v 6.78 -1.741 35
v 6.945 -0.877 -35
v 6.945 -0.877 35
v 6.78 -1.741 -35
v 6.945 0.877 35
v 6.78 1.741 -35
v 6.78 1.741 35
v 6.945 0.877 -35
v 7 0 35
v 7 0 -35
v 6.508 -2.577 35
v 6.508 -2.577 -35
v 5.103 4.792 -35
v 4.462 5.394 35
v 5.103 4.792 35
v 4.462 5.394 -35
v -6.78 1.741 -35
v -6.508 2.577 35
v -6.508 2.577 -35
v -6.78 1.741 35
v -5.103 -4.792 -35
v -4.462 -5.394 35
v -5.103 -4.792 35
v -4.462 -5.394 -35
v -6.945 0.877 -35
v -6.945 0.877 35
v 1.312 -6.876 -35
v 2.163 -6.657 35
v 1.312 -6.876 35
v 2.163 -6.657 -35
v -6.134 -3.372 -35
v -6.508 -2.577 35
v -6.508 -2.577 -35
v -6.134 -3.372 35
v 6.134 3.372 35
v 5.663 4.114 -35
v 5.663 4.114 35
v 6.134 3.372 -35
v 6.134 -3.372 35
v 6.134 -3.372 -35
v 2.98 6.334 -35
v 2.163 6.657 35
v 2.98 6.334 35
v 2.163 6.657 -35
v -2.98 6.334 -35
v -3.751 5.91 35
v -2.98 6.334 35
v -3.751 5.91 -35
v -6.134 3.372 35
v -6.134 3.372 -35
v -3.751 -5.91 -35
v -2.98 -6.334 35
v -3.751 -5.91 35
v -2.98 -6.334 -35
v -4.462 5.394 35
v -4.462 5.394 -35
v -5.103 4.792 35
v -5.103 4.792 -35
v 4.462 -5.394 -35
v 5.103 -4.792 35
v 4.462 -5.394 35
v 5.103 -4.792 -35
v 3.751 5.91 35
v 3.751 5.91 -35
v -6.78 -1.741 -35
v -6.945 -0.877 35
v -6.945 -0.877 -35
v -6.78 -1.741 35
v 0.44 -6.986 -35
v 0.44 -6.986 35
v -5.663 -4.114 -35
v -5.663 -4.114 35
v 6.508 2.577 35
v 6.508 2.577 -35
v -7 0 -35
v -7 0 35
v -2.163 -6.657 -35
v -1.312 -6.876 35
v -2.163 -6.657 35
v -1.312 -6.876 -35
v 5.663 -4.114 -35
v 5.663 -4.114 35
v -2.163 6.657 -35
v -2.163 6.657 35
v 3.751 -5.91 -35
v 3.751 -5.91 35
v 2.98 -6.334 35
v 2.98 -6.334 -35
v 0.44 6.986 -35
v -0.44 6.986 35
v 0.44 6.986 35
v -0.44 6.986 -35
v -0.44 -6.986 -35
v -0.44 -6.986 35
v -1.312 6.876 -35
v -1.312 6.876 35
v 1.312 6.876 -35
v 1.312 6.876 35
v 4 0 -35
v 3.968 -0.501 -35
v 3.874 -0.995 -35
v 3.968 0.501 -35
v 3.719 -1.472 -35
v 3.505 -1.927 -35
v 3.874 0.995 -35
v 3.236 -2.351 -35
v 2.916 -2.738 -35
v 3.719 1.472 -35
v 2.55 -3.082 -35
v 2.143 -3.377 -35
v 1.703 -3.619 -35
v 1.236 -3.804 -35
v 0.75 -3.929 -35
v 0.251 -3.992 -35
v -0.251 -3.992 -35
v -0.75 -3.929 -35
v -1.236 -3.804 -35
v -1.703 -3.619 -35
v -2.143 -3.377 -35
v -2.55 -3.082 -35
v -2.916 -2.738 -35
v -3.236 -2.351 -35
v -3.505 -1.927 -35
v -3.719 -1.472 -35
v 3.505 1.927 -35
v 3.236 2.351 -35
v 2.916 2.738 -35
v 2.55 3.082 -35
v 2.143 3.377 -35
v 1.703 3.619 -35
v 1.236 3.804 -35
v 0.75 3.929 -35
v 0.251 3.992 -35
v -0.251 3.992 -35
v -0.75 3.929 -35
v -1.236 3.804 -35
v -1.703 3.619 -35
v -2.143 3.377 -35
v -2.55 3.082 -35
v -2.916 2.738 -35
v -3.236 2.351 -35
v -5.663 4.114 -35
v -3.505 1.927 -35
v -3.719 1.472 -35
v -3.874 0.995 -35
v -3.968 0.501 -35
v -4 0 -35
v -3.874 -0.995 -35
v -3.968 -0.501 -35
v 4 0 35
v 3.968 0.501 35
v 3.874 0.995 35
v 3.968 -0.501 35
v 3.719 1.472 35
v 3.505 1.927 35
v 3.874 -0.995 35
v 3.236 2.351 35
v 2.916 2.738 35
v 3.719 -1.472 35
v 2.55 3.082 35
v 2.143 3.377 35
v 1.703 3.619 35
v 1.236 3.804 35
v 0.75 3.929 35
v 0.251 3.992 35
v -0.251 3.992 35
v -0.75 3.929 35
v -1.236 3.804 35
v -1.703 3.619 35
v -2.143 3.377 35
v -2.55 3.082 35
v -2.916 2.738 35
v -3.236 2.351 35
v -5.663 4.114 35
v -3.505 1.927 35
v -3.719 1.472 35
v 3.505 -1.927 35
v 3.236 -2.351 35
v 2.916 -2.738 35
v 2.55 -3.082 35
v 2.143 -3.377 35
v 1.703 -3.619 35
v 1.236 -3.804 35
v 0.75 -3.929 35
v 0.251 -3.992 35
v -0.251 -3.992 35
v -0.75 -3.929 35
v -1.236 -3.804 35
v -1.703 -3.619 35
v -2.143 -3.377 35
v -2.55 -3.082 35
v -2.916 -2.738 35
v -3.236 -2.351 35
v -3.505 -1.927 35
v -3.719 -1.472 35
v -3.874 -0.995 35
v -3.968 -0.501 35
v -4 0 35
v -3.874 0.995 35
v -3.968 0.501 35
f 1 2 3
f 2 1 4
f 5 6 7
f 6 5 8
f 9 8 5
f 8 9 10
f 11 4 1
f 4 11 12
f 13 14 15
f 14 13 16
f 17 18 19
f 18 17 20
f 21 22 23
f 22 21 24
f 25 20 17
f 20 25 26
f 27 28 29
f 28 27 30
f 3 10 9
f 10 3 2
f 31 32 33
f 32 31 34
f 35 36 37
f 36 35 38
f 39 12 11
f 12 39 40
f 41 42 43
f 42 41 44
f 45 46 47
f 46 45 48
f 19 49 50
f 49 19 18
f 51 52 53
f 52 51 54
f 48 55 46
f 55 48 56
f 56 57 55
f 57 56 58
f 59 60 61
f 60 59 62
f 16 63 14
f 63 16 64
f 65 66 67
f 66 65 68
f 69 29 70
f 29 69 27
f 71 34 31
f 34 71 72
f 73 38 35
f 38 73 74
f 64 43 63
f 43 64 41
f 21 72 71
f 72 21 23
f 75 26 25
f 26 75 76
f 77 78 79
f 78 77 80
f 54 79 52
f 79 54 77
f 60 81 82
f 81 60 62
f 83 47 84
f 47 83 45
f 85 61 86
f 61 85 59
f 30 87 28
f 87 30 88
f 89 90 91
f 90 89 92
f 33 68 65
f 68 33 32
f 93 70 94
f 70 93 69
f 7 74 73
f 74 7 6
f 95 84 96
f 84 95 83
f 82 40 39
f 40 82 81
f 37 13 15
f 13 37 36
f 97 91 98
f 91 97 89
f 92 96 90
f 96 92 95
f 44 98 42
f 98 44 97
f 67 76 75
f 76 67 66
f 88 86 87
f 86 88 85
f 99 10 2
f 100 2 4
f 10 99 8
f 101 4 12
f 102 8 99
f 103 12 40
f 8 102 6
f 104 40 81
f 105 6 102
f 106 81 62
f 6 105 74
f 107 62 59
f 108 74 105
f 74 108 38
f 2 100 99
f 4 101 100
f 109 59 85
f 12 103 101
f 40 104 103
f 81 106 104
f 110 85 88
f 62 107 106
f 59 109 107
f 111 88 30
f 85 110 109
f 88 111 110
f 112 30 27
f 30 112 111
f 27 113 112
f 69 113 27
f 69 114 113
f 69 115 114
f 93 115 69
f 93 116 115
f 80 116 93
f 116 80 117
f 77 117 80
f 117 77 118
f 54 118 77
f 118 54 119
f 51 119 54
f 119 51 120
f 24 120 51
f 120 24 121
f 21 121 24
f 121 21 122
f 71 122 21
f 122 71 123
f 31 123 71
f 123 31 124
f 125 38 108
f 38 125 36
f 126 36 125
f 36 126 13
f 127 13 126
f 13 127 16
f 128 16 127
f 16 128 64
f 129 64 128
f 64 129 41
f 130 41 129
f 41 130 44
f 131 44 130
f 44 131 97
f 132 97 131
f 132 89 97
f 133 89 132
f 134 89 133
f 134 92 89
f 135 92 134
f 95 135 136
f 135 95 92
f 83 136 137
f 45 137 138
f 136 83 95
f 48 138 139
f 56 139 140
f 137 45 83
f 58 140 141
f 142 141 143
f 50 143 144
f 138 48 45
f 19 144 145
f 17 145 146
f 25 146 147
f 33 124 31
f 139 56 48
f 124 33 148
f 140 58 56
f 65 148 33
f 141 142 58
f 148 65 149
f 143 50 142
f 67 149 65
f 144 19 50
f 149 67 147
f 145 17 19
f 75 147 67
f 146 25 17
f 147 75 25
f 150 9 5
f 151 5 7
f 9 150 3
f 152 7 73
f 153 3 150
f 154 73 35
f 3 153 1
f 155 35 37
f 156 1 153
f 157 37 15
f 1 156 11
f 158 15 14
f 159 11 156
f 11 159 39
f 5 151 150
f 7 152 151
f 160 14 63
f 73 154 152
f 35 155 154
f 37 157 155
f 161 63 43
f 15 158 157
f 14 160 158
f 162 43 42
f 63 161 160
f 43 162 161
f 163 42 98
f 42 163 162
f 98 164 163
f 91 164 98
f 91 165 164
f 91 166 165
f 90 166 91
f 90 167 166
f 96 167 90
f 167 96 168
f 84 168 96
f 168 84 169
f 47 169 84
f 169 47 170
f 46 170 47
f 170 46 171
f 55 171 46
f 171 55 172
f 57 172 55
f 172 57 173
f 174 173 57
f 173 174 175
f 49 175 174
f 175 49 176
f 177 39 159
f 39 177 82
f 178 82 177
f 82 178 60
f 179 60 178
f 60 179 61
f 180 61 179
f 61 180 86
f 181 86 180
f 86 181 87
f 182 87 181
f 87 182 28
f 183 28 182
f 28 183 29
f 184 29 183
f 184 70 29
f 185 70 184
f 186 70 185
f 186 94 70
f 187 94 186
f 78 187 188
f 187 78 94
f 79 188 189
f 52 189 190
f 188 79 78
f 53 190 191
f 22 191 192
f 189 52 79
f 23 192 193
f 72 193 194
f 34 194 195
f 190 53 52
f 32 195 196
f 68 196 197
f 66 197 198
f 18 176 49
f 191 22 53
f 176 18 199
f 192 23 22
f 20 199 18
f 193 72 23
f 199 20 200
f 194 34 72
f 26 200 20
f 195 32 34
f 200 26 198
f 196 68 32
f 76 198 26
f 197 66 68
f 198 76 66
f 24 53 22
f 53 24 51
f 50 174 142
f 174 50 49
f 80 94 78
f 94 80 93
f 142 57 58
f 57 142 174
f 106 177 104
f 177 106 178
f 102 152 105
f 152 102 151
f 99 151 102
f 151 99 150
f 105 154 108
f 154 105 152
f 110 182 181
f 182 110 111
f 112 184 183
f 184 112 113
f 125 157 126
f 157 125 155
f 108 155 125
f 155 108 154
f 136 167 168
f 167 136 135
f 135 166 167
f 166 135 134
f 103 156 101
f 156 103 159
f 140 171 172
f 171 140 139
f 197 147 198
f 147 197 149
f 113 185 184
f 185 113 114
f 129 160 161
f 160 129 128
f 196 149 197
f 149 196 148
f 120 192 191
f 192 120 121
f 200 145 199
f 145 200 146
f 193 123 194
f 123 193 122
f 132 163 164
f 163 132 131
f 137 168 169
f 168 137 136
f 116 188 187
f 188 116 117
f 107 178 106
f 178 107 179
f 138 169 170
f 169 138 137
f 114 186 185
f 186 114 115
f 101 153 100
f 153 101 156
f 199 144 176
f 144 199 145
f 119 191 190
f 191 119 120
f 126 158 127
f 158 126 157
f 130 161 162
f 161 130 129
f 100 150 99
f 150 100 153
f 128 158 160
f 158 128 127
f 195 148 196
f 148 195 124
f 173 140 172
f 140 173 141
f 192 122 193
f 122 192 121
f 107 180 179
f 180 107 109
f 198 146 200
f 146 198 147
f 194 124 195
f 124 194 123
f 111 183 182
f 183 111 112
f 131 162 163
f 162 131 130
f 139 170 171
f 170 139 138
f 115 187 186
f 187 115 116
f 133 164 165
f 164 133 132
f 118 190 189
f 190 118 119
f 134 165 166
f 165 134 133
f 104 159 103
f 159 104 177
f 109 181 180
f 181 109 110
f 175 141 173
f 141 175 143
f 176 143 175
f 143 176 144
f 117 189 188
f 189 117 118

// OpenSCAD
$fn = 50;


difference() {
	union() {
		translate(v = [0, 0, -35.0000000000]) {
			cylinder(h = 70, r = 7.0000000000);
		}
	}
	union() {
		translate(v = [0, 0, -100.0000000000]) {
			cylinder(h = 200, r = 4.0000000000);
		}
	}
}
